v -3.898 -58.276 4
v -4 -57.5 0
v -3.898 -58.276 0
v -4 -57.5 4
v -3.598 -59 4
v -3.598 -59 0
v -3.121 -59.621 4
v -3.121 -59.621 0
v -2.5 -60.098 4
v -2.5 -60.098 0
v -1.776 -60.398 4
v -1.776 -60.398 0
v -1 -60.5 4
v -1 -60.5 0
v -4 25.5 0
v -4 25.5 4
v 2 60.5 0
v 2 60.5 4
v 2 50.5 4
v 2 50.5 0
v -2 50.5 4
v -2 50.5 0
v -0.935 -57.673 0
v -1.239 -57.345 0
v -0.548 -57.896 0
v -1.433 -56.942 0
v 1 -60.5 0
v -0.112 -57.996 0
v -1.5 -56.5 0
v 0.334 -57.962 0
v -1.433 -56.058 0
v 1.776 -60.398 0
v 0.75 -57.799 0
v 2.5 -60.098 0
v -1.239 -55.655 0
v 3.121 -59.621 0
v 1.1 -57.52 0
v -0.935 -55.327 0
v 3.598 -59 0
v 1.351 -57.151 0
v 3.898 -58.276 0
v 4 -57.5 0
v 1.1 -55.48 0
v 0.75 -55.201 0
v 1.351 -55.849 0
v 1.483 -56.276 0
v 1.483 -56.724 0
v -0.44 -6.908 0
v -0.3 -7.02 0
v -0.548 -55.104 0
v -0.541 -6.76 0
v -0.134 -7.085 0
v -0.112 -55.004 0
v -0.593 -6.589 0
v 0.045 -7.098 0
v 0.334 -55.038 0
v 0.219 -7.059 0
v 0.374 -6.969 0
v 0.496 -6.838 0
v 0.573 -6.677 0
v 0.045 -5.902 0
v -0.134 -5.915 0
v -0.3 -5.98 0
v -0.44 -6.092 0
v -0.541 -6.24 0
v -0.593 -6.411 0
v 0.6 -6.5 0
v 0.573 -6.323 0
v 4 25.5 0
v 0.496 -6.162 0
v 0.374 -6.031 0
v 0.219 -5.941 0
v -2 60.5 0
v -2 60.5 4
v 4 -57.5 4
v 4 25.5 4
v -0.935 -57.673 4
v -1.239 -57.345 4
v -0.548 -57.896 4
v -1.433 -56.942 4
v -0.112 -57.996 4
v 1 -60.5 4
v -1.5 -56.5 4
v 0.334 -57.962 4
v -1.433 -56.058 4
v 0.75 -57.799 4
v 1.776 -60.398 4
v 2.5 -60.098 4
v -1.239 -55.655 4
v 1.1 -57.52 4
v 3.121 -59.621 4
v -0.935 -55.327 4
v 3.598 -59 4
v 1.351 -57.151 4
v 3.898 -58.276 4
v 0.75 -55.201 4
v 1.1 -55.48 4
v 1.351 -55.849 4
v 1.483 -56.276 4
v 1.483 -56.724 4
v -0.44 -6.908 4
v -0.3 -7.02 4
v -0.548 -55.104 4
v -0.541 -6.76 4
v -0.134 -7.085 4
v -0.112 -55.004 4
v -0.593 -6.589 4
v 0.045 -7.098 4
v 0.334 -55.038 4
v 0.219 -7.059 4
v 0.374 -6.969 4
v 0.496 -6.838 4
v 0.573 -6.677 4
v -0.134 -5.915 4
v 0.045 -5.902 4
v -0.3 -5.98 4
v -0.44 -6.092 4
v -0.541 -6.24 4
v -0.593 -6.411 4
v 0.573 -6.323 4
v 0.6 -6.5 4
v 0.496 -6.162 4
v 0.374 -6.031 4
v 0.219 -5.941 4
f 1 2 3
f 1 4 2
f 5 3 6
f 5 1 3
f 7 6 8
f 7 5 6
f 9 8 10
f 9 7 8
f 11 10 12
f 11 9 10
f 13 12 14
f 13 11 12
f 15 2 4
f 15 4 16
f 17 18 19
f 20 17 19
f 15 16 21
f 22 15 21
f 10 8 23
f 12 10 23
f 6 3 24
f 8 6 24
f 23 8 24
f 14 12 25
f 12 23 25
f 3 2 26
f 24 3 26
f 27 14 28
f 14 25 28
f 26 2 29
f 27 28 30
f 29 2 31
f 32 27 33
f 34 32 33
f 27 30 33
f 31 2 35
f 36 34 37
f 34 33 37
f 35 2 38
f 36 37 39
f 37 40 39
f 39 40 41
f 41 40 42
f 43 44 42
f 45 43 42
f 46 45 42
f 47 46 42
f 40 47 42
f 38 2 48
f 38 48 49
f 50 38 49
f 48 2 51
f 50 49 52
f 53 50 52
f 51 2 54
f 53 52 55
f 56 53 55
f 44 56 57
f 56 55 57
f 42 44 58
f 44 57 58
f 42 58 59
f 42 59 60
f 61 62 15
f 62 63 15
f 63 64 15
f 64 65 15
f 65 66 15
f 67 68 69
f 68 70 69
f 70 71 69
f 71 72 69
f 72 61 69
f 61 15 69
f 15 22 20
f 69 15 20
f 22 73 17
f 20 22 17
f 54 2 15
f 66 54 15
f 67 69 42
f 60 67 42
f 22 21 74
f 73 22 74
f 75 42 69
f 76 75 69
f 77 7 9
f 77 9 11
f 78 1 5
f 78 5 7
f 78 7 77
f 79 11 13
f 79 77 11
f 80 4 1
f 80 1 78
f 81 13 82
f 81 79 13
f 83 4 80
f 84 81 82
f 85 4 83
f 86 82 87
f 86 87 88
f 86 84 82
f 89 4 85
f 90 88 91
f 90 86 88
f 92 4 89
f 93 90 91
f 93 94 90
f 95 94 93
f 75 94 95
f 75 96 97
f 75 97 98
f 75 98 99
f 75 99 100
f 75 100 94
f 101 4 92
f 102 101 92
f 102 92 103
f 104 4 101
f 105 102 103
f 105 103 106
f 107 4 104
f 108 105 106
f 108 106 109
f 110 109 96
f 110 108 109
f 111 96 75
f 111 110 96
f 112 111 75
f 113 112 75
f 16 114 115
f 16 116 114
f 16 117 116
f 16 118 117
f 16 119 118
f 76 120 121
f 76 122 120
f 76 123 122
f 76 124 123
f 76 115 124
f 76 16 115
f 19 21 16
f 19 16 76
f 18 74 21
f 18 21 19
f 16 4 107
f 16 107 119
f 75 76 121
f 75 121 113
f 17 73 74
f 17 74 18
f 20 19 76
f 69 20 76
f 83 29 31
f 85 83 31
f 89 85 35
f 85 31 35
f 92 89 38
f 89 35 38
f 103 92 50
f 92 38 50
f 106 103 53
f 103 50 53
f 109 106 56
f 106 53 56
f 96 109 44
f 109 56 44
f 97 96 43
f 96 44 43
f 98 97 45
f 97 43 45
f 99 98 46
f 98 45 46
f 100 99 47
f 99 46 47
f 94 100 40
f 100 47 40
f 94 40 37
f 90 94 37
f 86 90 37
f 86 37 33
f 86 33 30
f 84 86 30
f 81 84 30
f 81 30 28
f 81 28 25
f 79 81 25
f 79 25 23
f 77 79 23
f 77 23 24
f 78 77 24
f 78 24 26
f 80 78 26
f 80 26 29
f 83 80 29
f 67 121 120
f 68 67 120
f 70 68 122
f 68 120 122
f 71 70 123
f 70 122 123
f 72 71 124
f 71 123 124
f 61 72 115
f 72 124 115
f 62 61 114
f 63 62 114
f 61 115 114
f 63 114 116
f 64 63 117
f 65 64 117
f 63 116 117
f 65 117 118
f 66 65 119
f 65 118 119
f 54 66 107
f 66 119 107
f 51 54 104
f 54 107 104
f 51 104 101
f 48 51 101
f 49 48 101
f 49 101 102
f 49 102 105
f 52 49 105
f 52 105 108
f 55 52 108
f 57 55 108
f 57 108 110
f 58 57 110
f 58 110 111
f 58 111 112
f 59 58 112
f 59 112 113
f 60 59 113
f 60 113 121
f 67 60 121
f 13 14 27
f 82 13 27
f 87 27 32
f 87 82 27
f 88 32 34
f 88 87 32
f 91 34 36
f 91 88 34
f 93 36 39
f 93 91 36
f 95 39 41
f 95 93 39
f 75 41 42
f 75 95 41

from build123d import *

# Parameters (mm, degrees)
SKETCH1_W             = 8
SKETCH1_H             = 121
BOSS_EXTRUDE1_DEPTH   = 4
FILLET1_R             = 3
CUT_EXTRUDE1_DEPTH    = 4
F_1_0MM_DOWEL_HOLE1_D = 3
SKETCH6_R             = 0.6
CUT_EXTRUDE2_DEPTH    = 10


with BuildPart() as part:
    # Sketch1 → Boss-Extrude1 (new body)
    with BuildSketch(Plane.XY):
        Rectangle(SKETCH1_W, SKETCH1_H)
    extrude(amount=BOSS_EXTRUDE1_DEPTH)

    # Fillet1
    fillet1_edges = [part.edges().sort_by_distance(p)[0] for p in [
        (4, -60.5, 2),
        (-4, -60.5, 2),
    ]]
    fillet(fillet1_edges, radius=FILLET1_R)

    # Sketch2 → Cut-Extrude1 (cut)
    with BuildSketch(Plane.XY.offset(4)):
        Polygon((-4, 25.5), (-2, 50.5), (-2, 60.5), (-4, 60.5), align=None)
        Polygon((2, 60.5), (2, 50.5), (4, 25.5), (4, 60.5), align=None)
    extrude(amount=-CUT_EXTRUDE1_DEPTH, mode=Mode.SUBTRACT)

    # Ø1.0mm Dowel Hole1 (through all)
    with Locations(Plane.XY.offset(4)):
        with Locations((0, -56.5)):
            Hole(F_1_0MM_DOWEL_HOLE1_D / 2)

    # Sketch6 → Cut-Extrude2 (cut)
    with BuildSketch(Plane.XY.offset(4)):
        with Locations((0, -6.5)):
            Circle(SKETCH6_R)
    extrude(amount=-CUT_EXTRUDE2_DEPTH, mode=Mode.SUBTRACT)


solid = part.part
